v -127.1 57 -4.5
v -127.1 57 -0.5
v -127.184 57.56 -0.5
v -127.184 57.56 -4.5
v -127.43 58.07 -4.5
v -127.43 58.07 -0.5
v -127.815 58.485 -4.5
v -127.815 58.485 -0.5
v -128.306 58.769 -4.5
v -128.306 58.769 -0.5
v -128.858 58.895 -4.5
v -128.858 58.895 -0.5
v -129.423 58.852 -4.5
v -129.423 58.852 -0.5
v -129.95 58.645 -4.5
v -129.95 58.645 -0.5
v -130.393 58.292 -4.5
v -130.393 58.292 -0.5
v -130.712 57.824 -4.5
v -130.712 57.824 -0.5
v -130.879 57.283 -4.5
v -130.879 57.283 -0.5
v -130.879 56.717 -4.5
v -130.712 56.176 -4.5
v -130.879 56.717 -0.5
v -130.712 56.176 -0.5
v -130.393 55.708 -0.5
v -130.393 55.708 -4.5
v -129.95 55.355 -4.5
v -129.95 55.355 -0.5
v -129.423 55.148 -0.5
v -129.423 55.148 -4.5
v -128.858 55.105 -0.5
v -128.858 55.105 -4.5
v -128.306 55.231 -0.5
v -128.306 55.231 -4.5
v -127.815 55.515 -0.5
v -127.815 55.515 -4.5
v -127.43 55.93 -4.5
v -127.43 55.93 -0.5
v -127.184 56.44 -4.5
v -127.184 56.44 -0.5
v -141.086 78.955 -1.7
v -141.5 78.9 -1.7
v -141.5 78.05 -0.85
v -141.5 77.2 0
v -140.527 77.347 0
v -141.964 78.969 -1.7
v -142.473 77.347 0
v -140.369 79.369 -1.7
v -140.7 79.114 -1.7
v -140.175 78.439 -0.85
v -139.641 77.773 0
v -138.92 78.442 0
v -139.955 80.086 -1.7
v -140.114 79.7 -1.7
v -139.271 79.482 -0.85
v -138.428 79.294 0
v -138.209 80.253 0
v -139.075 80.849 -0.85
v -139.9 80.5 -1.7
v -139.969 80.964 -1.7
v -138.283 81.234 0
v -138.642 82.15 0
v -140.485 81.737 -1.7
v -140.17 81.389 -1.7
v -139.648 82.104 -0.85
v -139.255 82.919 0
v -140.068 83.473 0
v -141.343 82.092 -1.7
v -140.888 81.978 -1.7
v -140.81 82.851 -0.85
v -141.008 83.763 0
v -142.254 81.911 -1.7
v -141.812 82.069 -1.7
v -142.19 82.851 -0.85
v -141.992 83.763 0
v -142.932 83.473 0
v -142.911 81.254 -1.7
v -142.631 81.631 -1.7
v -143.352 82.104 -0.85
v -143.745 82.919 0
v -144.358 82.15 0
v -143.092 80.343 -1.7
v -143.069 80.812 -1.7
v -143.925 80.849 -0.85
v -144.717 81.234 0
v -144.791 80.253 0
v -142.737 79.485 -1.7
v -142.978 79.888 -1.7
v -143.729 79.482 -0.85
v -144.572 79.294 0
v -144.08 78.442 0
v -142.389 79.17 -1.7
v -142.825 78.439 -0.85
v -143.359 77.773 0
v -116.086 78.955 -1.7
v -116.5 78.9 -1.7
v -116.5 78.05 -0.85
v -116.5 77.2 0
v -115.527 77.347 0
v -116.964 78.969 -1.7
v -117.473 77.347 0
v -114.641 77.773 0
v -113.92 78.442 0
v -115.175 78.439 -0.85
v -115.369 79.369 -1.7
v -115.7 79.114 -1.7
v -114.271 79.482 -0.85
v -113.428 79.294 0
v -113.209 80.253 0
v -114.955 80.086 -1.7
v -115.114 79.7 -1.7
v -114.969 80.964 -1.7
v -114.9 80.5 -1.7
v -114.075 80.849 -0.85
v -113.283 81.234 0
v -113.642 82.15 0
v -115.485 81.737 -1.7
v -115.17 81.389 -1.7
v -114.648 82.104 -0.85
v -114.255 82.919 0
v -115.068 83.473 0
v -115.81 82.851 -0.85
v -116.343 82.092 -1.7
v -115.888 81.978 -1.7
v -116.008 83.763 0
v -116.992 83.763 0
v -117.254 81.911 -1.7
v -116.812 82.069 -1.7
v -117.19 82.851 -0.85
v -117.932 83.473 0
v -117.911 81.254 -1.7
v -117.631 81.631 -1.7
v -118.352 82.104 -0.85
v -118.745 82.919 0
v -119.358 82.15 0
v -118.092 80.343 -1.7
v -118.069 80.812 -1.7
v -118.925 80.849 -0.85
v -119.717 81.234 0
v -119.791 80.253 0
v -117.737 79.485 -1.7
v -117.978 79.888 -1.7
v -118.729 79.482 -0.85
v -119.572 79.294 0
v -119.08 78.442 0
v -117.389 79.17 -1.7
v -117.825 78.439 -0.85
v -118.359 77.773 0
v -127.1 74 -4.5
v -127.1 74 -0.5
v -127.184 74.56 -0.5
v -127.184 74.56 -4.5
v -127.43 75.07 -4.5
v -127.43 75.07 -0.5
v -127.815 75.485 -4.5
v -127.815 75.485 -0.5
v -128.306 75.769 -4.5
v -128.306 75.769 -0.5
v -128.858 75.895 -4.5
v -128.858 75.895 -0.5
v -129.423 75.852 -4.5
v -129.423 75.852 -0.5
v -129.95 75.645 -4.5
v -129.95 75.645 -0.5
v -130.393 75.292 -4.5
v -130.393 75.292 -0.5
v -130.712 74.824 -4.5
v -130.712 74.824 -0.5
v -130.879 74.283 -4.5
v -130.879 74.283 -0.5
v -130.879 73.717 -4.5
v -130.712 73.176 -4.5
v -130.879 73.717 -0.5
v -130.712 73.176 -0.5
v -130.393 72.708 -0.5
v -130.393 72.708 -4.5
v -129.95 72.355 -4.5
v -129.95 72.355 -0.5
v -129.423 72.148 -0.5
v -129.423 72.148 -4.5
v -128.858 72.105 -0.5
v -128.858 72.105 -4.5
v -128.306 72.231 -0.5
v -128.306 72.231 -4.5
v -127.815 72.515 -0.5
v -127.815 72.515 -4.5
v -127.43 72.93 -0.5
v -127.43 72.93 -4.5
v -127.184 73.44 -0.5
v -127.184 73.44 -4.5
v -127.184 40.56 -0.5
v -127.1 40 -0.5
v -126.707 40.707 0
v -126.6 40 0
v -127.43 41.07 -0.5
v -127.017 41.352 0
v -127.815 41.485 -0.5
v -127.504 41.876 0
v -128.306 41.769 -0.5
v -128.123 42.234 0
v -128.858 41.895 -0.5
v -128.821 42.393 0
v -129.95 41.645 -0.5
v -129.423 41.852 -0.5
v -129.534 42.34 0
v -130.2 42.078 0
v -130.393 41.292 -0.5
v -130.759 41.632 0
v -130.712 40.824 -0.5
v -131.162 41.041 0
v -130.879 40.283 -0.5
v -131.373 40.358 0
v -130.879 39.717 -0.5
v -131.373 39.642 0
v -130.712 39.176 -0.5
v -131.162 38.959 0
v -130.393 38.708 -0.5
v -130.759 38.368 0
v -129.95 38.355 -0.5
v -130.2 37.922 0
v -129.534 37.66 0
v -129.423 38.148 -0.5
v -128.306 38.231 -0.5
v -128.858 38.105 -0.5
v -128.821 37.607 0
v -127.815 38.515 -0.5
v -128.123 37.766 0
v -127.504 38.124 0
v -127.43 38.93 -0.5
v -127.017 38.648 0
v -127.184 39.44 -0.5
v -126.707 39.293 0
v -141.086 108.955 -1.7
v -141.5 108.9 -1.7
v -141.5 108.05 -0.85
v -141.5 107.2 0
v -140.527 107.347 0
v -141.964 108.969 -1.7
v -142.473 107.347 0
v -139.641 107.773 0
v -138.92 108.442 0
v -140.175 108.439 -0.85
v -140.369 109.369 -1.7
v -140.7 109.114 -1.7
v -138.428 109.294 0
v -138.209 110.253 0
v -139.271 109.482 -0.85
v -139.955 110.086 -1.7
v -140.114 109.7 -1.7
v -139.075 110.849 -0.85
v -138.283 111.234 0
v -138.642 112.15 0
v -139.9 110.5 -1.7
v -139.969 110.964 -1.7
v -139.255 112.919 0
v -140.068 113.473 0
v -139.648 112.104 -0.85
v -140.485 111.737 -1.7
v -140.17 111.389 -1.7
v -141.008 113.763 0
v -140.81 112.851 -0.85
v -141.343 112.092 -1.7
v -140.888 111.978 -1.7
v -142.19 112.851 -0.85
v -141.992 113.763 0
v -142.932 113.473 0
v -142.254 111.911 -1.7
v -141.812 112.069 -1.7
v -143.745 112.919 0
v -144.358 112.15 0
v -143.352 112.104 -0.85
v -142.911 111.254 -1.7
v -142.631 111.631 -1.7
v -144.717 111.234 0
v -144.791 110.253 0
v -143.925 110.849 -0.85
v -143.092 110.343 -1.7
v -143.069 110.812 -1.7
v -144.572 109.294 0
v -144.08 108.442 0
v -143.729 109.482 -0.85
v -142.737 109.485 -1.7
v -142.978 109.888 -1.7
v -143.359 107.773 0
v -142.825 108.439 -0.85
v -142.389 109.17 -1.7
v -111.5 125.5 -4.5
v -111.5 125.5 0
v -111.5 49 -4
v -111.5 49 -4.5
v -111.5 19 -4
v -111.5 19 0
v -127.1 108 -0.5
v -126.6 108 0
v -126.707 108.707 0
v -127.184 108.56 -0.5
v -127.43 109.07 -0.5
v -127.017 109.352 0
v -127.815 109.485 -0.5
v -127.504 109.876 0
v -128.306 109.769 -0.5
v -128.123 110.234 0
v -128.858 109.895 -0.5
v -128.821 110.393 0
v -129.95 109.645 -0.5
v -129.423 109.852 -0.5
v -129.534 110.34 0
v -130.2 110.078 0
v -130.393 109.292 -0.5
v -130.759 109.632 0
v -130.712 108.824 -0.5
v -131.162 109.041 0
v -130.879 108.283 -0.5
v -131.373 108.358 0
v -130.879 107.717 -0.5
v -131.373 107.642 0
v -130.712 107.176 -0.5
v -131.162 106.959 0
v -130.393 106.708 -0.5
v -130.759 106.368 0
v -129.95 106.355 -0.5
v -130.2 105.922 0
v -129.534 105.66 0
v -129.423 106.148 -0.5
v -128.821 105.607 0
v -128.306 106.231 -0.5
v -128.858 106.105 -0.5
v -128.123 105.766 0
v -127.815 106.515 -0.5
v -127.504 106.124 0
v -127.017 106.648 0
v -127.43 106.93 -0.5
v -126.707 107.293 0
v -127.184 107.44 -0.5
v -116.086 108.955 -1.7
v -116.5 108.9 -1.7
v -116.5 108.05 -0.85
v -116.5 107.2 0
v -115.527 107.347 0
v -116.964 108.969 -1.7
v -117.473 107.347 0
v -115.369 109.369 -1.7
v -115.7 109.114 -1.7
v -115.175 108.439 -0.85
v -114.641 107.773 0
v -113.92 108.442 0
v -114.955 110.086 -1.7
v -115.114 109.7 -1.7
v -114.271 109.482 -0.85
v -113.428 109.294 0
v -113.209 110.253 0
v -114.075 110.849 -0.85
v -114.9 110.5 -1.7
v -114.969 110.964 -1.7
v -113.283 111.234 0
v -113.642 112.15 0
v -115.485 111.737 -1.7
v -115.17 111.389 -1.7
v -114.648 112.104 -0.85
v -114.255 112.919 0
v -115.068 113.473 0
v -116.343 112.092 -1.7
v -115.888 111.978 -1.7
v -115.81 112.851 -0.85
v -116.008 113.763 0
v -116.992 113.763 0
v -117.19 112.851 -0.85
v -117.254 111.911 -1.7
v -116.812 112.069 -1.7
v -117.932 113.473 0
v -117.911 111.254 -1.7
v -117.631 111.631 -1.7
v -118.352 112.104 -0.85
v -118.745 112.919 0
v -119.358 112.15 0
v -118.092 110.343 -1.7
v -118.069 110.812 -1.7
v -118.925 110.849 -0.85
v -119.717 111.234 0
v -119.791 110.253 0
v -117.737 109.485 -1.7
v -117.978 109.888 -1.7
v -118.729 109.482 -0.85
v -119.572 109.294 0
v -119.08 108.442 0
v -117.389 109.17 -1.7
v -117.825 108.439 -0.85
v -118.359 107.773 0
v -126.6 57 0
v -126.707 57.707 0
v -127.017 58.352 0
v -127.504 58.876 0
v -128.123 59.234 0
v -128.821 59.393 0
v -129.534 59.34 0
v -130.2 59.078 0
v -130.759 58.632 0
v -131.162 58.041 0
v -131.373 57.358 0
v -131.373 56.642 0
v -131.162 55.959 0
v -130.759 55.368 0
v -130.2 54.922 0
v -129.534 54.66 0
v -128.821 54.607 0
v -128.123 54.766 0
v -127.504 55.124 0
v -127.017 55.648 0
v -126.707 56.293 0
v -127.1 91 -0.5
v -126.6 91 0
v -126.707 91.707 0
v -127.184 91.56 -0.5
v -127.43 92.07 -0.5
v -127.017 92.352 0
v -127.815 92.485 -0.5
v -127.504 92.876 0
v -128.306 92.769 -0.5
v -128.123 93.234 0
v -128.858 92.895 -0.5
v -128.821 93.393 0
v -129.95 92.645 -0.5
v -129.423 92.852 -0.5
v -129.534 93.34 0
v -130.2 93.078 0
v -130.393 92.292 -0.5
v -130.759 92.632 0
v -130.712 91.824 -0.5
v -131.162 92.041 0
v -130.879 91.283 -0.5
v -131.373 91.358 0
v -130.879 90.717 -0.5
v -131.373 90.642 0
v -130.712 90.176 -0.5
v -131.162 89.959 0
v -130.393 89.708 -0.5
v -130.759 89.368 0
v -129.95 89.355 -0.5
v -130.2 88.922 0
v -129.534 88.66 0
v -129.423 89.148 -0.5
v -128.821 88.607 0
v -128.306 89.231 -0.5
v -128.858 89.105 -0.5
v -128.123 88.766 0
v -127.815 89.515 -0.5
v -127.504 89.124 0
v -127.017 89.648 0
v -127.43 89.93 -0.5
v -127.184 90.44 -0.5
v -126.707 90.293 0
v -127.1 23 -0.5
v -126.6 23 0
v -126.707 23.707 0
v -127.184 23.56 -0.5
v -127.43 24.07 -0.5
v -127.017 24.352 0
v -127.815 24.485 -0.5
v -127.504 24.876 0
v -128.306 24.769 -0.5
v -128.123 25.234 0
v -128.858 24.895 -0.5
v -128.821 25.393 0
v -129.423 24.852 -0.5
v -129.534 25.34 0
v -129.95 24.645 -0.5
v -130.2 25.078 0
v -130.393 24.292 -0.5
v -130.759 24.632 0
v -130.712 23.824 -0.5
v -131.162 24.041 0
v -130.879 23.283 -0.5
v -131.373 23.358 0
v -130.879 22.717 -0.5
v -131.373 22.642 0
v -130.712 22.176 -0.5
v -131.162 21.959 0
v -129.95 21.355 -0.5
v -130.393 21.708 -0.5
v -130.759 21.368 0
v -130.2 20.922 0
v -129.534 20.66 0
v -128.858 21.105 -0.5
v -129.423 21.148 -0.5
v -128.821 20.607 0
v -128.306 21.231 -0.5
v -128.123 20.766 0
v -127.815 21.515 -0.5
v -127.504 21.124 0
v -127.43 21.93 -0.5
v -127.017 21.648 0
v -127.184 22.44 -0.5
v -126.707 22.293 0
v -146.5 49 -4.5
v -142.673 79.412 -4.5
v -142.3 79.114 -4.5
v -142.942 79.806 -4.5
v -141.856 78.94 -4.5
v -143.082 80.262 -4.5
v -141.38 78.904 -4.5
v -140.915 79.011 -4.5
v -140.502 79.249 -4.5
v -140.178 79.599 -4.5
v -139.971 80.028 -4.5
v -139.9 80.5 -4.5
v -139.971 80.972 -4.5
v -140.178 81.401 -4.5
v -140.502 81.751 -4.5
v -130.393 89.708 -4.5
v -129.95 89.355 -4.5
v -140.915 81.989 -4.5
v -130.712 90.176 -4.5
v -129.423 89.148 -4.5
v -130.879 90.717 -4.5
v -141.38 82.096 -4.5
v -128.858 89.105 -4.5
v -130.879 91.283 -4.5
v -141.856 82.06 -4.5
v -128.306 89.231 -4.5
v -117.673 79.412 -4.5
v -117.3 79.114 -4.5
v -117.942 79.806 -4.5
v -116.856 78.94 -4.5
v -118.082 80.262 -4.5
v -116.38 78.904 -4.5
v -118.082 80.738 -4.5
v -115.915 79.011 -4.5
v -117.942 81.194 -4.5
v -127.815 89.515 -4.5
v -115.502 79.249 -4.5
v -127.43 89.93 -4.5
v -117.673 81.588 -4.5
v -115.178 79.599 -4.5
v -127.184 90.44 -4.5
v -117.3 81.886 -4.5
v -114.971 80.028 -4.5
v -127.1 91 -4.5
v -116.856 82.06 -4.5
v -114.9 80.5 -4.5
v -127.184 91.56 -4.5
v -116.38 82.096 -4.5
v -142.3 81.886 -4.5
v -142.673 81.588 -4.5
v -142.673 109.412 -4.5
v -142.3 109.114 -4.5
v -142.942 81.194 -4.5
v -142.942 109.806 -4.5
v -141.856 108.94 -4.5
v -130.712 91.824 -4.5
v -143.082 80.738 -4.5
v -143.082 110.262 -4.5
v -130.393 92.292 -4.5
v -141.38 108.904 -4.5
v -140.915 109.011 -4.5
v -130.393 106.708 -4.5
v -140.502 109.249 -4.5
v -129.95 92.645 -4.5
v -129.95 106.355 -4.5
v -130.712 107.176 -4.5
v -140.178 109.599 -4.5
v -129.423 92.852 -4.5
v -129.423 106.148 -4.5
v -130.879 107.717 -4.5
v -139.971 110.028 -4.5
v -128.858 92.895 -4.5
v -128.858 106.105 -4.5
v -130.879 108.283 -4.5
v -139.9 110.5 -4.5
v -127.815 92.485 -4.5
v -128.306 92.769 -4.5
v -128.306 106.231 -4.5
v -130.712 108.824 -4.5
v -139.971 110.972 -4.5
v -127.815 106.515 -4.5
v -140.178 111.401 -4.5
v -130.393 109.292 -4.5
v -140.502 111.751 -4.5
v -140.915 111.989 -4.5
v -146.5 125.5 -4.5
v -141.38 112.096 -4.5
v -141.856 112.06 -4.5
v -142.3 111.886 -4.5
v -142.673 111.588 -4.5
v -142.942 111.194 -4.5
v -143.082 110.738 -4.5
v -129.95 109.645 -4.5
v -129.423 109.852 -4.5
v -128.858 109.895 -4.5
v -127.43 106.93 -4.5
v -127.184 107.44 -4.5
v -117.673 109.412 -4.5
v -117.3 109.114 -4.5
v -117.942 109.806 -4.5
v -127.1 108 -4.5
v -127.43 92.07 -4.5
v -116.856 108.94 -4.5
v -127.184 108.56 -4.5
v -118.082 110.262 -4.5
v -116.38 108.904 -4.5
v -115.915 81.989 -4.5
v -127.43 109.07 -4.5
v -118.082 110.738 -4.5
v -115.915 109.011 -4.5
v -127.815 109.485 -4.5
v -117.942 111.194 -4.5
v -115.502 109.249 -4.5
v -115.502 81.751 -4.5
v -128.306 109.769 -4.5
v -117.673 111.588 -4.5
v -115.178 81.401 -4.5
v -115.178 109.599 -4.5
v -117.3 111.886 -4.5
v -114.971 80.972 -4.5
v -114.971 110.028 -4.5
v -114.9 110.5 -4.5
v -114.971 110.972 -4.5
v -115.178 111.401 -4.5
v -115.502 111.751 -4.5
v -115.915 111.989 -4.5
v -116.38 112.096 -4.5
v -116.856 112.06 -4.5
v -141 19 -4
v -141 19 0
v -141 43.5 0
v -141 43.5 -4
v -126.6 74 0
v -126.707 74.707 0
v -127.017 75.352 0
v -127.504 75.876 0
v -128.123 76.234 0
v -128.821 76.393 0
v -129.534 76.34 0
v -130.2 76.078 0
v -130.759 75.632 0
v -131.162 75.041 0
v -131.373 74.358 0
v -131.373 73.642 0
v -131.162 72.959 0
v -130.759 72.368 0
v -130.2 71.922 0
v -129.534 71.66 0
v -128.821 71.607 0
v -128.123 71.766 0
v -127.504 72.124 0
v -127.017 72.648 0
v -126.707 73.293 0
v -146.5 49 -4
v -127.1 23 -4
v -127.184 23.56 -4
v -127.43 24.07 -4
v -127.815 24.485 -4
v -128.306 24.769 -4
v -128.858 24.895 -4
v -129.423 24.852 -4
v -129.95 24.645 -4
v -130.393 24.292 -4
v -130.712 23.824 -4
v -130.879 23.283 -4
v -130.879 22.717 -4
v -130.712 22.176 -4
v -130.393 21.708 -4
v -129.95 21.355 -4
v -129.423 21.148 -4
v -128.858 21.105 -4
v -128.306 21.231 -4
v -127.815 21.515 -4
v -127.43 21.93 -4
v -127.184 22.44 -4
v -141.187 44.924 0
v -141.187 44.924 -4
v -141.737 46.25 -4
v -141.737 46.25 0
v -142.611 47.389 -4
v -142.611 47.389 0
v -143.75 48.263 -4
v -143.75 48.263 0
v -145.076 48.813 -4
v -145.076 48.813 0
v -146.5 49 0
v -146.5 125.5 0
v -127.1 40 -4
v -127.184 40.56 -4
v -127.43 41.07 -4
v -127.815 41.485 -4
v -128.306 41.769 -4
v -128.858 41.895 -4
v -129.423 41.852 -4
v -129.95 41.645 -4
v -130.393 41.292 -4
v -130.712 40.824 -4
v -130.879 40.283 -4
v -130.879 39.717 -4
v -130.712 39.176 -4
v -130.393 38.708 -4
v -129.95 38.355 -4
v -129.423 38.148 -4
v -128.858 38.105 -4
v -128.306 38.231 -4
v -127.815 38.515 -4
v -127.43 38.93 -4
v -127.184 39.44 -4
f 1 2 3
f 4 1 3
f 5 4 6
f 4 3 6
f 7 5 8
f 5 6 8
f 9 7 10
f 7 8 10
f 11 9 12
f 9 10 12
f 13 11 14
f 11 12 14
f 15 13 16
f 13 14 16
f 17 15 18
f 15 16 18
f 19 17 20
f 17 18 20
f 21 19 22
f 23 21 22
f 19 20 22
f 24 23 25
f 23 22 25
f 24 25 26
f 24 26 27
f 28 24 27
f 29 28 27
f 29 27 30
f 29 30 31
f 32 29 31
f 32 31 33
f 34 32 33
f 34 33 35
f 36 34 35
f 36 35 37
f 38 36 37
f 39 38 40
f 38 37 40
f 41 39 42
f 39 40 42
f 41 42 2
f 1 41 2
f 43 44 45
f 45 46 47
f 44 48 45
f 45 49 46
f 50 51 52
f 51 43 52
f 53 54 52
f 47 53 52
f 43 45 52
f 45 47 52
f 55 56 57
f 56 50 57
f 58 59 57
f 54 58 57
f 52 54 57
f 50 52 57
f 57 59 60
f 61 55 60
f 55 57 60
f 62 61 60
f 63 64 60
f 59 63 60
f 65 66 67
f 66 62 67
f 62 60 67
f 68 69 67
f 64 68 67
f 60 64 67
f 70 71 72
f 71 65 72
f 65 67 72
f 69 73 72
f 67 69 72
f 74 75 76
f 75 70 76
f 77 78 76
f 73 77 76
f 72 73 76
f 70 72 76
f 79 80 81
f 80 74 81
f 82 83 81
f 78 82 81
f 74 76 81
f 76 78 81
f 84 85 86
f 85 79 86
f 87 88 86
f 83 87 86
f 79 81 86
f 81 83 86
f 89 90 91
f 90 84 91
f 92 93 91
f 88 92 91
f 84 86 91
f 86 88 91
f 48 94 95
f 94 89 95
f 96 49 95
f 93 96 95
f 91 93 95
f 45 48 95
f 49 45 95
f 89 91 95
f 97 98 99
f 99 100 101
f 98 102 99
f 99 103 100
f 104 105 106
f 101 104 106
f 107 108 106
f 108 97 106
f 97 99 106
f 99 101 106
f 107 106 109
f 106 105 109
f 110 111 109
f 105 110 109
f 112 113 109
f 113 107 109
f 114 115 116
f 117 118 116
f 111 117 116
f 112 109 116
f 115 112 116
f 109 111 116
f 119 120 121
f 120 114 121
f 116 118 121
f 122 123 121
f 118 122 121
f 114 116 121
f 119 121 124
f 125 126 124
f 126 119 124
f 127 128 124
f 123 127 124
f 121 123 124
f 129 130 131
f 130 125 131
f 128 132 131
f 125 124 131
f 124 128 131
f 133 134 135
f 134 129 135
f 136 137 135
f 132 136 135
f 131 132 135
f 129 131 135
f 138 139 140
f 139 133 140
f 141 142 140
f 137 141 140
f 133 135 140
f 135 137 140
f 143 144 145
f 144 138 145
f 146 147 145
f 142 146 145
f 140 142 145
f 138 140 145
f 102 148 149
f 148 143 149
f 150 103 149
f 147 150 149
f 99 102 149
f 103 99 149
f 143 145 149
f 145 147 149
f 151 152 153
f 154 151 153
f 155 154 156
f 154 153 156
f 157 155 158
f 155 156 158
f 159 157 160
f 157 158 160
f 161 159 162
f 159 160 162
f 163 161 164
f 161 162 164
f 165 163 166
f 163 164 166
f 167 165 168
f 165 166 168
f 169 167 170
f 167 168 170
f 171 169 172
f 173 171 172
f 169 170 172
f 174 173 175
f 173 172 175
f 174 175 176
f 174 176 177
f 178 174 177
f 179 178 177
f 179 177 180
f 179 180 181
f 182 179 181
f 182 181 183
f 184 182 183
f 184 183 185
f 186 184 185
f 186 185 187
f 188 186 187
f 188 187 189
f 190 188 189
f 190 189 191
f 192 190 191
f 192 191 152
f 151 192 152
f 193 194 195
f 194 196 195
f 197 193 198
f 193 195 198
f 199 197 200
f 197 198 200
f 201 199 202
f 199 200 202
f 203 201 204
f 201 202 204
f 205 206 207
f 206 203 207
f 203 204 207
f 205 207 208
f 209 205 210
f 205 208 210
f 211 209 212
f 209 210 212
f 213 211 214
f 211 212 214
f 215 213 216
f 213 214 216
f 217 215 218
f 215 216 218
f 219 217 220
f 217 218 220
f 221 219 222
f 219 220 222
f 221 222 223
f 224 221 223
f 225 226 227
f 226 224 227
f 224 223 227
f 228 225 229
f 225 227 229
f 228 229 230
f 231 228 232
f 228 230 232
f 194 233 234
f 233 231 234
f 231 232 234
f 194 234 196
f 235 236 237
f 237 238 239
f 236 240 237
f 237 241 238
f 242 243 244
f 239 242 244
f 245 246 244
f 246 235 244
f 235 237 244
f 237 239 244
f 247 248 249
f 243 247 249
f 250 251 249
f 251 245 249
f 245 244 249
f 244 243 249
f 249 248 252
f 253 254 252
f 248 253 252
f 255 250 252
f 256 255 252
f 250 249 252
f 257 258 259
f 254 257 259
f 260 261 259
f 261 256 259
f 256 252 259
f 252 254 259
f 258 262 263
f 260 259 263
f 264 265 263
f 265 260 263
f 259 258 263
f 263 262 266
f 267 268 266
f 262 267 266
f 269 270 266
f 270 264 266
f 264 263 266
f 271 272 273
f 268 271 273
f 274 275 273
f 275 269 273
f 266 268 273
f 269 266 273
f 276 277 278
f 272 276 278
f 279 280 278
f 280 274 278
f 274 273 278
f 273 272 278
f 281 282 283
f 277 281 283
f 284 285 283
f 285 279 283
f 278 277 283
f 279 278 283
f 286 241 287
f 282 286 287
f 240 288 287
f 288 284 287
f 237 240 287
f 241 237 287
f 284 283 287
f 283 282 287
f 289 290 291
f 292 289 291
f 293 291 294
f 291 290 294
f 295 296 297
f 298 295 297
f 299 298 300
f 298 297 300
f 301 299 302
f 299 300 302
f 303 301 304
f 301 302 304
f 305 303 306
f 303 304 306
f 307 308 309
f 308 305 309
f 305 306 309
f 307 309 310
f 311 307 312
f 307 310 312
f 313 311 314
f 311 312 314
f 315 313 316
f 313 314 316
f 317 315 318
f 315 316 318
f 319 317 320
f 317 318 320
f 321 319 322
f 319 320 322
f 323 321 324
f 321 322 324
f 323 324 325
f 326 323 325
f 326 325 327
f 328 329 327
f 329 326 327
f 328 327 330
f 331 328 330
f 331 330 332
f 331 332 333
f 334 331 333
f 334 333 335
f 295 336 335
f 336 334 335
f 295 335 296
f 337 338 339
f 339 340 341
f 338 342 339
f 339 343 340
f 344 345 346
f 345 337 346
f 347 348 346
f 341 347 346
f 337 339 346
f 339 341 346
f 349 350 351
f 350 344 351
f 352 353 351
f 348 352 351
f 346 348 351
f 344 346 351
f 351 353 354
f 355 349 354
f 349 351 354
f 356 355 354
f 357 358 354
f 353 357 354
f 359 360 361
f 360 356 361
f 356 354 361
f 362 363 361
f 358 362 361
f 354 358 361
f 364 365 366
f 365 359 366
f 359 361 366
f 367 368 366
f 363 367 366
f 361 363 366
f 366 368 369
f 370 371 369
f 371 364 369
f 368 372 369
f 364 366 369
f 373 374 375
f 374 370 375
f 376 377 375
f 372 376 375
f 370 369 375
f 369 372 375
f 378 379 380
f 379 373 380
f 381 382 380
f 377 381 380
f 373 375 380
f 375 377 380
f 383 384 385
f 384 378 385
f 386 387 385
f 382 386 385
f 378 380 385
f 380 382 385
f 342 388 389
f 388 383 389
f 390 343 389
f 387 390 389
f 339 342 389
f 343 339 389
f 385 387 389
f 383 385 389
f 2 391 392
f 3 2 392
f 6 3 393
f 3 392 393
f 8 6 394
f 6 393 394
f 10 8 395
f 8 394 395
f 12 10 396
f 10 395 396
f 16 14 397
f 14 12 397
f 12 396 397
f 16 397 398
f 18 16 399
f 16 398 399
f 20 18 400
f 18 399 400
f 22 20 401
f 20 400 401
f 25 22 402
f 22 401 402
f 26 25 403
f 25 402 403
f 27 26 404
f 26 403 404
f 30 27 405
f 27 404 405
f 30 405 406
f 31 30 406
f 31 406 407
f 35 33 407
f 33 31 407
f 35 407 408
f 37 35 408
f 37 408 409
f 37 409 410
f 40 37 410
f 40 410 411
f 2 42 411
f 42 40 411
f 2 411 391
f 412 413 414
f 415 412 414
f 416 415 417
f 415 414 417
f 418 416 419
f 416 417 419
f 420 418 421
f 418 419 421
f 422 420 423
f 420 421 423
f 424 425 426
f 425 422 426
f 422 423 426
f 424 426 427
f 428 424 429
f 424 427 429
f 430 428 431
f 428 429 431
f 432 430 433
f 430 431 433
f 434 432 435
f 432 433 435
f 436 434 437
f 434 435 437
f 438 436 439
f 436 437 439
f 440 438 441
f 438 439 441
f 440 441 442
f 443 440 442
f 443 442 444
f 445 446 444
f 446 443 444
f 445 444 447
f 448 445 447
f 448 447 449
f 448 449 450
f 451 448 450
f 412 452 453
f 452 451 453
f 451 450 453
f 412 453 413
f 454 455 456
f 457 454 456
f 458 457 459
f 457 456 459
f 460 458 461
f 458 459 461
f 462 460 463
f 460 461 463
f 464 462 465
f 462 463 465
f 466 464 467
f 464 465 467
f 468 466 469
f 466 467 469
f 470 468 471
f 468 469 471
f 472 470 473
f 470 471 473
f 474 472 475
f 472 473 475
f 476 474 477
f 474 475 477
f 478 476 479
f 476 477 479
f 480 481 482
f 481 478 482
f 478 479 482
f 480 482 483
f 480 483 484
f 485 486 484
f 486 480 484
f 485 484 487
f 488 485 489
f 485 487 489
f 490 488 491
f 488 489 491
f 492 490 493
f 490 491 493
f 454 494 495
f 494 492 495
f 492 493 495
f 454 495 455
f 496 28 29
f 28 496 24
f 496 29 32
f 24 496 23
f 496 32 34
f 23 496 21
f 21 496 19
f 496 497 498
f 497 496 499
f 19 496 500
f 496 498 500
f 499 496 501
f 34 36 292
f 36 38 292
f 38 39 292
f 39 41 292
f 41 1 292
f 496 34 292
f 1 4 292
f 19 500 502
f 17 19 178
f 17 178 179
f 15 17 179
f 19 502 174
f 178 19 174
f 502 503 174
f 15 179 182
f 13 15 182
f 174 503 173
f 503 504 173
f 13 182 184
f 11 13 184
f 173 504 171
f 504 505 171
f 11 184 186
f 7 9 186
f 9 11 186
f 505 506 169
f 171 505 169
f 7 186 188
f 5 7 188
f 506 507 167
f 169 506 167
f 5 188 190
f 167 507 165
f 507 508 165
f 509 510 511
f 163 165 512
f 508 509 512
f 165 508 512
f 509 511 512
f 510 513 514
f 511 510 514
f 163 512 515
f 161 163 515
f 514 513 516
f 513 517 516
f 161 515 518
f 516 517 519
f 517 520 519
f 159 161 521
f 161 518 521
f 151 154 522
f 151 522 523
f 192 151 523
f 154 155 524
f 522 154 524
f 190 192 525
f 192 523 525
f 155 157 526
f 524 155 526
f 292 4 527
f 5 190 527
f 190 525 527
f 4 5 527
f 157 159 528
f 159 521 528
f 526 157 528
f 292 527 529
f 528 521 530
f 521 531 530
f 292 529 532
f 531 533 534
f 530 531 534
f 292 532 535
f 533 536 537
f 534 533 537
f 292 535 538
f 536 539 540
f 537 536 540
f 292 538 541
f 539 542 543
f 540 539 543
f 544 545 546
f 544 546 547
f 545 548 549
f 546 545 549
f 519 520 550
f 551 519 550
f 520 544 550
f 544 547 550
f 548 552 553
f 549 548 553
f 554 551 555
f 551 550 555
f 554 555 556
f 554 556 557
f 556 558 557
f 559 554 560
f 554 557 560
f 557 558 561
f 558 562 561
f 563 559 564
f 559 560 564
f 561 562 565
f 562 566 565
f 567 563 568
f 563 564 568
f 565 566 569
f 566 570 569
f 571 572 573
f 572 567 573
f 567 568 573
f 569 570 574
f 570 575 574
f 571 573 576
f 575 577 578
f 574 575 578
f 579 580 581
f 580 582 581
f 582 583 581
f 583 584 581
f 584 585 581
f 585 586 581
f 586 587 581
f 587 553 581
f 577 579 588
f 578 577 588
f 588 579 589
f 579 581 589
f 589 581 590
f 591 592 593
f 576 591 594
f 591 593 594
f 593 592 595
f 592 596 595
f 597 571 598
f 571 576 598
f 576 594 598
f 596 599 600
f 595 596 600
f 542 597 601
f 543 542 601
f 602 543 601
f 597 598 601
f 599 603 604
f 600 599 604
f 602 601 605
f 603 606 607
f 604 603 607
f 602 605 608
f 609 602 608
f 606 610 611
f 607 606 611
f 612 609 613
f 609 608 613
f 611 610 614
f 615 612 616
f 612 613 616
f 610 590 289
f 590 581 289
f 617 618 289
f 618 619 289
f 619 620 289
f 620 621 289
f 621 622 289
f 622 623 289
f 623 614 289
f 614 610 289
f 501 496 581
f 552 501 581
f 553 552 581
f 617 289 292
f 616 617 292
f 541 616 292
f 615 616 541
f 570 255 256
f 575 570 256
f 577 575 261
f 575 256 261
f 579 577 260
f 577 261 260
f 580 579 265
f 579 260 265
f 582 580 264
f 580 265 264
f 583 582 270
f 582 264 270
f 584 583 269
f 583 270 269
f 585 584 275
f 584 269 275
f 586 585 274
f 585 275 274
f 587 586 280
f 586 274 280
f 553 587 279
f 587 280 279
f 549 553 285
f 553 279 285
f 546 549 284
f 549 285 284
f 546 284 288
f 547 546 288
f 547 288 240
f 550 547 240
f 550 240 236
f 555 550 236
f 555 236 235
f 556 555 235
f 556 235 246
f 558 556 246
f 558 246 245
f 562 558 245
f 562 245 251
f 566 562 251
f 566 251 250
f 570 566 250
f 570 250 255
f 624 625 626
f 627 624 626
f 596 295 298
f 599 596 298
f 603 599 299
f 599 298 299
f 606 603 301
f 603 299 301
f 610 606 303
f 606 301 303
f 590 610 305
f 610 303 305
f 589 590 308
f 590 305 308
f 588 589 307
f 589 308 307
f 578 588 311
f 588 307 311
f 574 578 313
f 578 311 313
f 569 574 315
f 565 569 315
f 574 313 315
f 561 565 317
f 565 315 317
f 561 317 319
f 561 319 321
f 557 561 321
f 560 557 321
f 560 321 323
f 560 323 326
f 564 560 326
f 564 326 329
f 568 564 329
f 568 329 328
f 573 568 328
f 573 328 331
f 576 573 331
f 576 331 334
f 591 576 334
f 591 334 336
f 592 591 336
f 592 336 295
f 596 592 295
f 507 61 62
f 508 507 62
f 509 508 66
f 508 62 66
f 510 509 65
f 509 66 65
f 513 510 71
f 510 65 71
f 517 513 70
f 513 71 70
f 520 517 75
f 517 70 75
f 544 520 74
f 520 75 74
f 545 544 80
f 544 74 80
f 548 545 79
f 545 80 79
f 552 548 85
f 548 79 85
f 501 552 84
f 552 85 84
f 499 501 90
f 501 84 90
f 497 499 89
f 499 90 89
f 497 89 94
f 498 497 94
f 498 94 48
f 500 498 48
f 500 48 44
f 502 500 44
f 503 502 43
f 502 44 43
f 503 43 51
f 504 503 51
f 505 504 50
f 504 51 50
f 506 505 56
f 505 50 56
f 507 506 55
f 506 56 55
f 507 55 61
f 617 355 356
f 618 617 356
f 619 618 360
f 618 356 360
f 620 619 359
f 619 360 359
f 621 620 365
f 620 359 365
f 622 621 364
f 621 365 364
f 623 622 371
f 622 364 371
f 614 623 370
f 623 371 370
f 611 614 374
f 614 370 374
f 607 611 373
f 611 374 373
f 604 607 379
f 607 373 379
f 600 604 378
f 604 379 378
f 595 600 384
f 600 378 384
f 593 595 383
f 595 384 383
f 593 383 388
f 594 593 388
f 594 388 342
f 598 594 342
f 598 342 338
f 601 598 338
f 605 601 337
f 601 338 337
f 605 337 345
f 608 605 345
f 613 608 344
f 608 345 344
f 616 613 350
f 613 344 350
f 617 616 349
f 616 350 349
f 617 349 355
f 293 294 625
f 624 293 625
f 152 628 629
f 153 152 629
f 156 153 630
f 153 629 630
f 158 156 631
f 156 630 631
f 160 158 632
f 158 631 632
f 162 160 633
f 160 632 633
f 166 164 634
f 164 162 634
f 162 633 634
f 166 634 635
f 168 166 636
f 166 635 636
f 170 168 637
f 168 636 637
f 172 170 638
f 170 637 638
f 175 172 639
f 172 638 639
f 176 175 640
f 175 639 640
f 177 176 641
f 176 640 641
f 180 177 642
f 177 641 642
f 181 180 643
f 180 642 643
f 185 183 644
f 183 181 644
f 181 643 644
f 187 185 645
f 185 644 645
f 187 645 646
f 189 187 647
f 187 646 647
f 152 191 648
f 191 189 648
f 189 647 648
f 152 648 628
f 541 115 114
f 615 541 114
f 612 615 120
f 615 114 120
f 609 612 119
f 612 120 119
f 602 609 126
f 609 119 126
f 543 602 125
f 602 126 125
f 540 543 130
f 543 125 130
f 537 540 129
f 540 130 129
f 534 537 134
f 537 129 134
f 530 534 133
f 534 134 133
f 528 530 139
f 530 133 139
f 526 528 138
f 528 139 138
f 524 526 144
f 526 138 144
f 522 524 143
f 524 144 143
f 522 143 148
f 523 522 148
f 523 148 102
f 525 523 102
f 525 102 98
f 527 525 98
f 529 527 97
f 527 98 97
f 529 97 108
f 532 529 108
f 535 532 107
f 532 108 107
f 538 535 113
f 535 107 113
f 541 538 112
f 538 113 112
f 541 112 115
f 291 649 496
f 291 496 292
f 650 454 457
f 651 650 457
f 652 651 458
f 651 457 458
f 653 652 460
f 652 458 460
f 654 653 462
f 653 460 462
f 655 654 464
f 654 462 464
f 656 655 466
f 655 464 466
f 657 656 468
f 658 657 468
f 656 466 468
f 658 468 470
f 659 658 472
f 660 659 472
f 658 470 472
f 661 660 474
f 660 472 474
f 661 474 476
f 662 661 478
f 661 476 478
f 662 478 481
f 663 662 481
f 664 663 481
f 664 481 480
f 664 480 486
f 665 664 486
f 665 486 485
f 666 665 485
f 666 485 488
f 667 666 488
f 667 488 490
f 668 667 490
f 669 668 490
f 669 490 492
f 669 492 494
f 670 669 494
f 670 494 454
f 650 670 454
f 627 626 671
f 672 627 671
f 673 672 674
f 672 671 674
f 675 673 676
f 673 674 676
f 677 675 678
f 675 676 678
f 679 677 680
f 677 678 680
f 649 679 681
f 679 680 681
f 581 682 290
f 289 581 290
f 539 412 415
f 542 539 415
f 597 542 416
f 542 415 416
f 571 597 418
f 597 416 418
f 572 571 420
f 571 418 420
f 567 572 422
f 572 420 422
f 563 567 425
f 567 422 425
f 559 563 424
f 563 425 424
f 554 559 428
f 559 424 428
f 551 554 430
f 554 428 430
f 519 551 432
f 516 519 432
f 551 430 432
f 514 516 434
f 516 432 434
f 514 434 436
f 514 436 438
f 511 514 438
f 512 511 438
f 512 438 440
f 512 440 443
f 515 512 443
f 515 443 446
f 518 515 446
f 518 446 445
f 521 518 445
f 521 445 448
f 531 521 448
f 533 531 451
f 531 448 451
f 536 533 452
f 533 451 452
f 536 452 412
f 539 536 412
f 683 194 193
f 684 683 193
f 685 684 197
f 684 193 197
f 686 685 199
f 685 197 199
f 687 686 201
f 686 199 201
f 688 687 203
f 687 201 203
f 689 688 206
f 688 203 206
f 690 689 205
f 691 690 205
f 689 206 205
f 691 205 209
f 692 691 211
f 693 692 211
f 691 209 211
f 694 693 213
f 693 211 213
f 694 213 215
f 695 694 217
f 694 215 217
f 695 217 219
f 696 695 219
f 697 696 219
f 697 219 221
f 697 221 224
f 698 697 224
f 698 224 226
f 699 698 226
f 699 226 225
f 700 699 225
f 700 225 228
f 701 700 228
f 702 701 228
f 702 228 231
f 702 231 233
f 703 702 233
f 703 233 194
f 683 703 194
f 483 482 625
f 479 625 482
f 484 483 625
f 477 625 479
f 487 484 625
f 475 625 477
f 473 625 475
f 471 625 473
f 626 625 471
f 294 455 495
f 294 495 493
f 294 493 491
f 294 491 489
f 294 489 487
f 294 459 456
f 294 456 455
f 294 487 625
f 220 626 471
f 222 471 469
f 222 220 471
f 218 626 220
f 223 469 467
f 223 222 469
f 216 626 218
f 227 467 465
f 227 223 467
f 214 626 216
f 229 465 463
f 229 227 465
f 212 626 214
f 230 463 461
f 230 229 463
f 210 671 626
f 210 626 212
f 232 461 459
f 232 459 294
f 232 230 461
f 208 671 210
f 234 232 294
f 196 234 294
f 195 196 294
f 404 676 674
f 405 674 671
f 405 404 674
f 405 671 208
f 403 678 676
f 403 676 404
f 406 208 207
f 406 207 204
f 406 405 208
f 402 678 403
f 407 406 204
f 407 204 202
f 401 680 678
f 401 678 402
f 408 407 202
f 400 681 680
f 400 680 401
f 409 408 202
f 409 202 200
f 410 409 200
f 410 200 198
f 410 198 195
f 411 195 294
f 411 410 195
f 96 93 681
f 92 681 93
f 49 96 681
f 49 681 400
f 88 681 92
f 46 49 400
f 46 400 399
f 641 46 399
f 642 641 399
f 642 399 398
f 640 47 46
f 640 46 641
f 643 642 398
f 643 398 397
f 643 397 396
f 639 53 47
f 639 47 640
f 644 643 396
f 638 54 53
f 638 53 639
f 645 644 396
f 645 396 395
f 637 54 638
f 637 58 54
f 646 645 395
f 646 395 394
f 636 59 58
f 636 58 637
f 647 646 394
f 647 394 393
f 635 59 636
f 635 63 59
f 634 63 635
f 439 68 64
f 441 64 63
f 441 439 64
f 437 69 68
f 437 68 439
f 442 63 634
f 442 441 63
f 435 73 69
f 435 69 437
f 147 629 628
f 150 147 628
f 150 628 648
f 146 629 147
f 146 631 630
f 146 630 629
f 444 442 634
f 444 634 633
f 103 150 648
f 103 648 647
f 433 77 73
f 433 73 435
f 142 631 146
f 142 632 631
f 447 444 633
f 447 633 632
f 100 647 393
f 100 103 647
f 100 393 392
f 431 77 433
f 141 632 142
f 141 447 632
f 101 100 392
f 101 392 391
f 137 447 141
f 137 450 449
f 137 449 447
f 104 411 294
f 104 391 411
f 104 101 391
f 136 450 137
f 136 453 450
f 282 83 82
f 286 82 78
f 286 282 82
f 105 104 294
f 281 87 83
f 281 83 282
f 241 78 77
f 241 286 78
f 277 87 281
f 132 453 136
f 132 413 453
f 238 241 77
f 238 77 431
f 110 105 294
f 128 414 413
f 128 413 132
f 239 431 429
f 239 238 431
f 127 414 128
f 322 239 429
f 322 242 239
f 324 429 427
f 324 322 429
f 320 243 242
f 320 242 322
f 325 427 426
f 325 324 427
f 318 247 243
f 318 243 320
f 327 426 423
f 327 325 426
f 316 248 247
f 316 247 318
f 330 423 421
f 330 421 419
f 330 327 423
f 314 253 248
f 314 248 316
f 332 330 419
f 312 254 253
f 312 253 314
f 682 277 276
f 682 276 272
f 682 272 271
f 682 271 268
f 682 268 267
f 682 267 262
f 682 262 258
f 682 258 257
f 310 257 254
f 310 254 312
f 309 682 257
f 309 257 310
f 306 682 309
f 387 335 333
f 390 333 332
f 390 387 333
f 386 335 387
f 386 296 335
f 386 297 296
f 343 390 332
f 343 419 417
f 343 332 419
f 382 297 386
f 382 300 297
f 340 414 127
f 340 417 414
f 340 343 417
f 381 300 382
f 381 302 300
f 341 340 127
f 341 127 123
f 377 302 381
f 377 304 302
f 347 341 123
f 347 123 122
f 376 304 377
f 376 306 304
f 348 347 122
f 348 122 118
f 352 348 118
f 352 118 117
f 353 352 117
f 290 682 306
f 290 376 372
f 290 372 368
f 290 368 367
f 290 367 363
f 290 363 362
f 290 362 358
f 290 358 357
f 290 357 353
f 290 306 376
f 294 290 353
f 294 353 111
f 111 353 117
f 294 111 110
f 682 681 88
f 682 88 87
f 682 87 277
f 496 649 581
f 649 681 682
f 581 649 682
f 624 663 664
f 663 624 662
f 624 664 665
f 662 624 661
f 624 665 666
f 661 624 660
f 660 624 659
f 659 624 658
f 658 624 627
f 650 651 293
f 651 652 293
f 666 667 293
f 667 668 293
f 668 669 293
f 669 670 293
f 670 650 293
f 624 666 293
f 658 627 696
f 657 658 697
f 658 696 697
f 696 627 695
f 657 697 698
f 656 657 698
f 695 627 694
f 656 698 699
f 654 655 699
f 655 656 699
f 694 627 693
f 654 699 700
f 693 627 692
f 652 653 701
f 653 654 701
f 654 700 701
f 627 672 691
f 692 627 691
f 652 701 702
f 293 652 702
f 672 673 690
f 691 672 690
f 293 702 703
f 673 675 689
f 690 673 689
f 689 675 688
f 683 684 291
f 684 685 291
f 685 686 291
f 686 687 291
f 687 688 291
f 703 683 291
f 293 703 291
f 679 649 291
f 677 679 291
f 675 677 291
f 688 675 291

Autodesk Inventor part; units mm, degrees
ref_plane "YZ Plane" through (0, 0, 0) normal (1, 0, 0) x (0, 1, 0)
ref_plane "XZ Plane" through (0, 0, 0) normal (0, 1, 0) x (-1, 0, 0)
sketch "Sketch1" plane through (0, 0, 0) normal (0, 0, 1) x (1, 0, 0)
  line L0 (-146.5, 49) -> (-146.5, 125.5)
  line L1 (-146.5, 125.5) -> (-111.5, 125.5)
  line L2 (-111.5, 125.5) -> (-111.5, 19)
  line L3 (-111.5, 19) -> (-141, 19)
  line L4 (-141, 19) -> (-141, 43.5)
  arc A0 (-141, 43.5) -> (-146.5, 49) centre (-146.5, 43.5) ccw
  line L5 (-129, 13.9597) -> (-129, 176.9597)
  circle A1 centre (-129, 23) radius 1.9
  circle A2 centre (-129, 40) radius 1.9
  circle A3 centre (-129, 57) radius 1.9
  circle A4 centre (-129, 74) radius 1.9
  circle A5 centre (-129, 91) radius 1.9
  circle A6 centre (-129, 108) radius 1.9
  circle A7 centre (-141.5, 80.5) radius 3.3
  circle A8 centre (-141.5, 80.5) radius 1.6
  line L6 (-154.2414, 80.5) -> (-103.7586, 80.5) construction
  circle A9 centre (-141.5, 110.5) radius 1.6
  circle A10 centre (-141.5, 110.5) radius 3.3
  circle A11 centre (-116.5, 80.5) radius 3.3
  circle A12 centre (-116.5, 80.5) radius 1.6
  circle A13 centre (-116.5, 110.5) radius 1.6
  circle A14 centre (-116.5, 110.5) radius 3.3
  line L7 (-146.5, 49) -> (-111.5, 49)
  point P0 (0, 0)
  dimension "d0" = 5.5
  dimension "d1" = 76.5
  dimension "d2" = 35
  dimension "d3" = 106.5
  dimension "d5" = 17.5
  dimension "d6" = 3.8
  dimension "d9" = 17
  dimension "d14" = 85
  dimension "d15" = 4
  dimension "d16" = 6.6
  dimension "d17" = 3.2
  dimension "d20" = 30
  dimension "d25" = 30
  dimension "d53" = 5
  dimension "d54" = 15
extrude "Extrusion1" add sketch "Sketch1" against normal blind 4.5 contours L0 L1 L5 A6 A5 A4 A3 L7 | L5 A3 A4 A5 A6 L1 L2 L7 | A7 | A10 | A11 | A14
sketch "Sketch2" plane through (0, 0, 0) normal (0, 0, 1) x (1, 0, 0)
  circle A0 centre (-141.5, 80.5) radius 1.6 projected
  circle A1 centre (-141.5, 110.5) radius 1.6 projected
  circle A2 centre (-116.5, 110.5) radius 1.6 projected
  circle A3 centre (-116.5, 80.5) radius 1.6 projected
  point P0 (0, 0)
hole "Hole1" at (-141.5, 80.5, 0) at (-141.5, 110.5, 0) at (-116.5, 110.5, 0) at (-116.5, 80.5, 0) direction (0, 0, -1) diameter 3.2 end through all countersink diameter 6.6 countersink angle 90
extrude "Extrusion2" add sketch "Sketch1" against normal blind 4 contours L7 L5 A2 A1 L3 L4 A0 | L7 L2 L3 L5 A1 A2
chamfer "Chamfer1" distance 0.5 angle 45 6 edges at (-130.9, 108, 0) (-130.9, 91, 0) (-130.9, 74, 0) (-130.9, 57, 0) (-130.9, 40, 0) (-130.9, 23, 0) measured on face at (-117.6556, 51.1917, 0)
thread "Thread1" size "M4x0.7" class "6H" standard "ISO Metric profile" full length
thread "Thread2" size "M4x0.7" class "6H" standard "ANSI Metric M Profile" full length
thread "Thread3" size "M4x0.7" class "6H" standard "ANSI Metric M Profile" full length
thread "Thread4" size "M4x0.7" class "6H" standard "ANSI Metric M Profile" full length
thread "Thread5" size "M4x0.7" class "6H" standard "ANSI Metric M Profile" full length
thread "Thread6" size "M4x0.7" class "6H" standard "ANSI Metric M Profile" full length
ref_plane "Work Plane1" through (-129, 13.9597, 0) normal (1, 0, 0) x (0, 1, 0)
equation "\"d6\" = m4"
equation "\"m3\" = 2.8"
equation "\"m4\" = 3.8"
properties part number "АНЦП.014.00.00.005" material "PET Plastic"
